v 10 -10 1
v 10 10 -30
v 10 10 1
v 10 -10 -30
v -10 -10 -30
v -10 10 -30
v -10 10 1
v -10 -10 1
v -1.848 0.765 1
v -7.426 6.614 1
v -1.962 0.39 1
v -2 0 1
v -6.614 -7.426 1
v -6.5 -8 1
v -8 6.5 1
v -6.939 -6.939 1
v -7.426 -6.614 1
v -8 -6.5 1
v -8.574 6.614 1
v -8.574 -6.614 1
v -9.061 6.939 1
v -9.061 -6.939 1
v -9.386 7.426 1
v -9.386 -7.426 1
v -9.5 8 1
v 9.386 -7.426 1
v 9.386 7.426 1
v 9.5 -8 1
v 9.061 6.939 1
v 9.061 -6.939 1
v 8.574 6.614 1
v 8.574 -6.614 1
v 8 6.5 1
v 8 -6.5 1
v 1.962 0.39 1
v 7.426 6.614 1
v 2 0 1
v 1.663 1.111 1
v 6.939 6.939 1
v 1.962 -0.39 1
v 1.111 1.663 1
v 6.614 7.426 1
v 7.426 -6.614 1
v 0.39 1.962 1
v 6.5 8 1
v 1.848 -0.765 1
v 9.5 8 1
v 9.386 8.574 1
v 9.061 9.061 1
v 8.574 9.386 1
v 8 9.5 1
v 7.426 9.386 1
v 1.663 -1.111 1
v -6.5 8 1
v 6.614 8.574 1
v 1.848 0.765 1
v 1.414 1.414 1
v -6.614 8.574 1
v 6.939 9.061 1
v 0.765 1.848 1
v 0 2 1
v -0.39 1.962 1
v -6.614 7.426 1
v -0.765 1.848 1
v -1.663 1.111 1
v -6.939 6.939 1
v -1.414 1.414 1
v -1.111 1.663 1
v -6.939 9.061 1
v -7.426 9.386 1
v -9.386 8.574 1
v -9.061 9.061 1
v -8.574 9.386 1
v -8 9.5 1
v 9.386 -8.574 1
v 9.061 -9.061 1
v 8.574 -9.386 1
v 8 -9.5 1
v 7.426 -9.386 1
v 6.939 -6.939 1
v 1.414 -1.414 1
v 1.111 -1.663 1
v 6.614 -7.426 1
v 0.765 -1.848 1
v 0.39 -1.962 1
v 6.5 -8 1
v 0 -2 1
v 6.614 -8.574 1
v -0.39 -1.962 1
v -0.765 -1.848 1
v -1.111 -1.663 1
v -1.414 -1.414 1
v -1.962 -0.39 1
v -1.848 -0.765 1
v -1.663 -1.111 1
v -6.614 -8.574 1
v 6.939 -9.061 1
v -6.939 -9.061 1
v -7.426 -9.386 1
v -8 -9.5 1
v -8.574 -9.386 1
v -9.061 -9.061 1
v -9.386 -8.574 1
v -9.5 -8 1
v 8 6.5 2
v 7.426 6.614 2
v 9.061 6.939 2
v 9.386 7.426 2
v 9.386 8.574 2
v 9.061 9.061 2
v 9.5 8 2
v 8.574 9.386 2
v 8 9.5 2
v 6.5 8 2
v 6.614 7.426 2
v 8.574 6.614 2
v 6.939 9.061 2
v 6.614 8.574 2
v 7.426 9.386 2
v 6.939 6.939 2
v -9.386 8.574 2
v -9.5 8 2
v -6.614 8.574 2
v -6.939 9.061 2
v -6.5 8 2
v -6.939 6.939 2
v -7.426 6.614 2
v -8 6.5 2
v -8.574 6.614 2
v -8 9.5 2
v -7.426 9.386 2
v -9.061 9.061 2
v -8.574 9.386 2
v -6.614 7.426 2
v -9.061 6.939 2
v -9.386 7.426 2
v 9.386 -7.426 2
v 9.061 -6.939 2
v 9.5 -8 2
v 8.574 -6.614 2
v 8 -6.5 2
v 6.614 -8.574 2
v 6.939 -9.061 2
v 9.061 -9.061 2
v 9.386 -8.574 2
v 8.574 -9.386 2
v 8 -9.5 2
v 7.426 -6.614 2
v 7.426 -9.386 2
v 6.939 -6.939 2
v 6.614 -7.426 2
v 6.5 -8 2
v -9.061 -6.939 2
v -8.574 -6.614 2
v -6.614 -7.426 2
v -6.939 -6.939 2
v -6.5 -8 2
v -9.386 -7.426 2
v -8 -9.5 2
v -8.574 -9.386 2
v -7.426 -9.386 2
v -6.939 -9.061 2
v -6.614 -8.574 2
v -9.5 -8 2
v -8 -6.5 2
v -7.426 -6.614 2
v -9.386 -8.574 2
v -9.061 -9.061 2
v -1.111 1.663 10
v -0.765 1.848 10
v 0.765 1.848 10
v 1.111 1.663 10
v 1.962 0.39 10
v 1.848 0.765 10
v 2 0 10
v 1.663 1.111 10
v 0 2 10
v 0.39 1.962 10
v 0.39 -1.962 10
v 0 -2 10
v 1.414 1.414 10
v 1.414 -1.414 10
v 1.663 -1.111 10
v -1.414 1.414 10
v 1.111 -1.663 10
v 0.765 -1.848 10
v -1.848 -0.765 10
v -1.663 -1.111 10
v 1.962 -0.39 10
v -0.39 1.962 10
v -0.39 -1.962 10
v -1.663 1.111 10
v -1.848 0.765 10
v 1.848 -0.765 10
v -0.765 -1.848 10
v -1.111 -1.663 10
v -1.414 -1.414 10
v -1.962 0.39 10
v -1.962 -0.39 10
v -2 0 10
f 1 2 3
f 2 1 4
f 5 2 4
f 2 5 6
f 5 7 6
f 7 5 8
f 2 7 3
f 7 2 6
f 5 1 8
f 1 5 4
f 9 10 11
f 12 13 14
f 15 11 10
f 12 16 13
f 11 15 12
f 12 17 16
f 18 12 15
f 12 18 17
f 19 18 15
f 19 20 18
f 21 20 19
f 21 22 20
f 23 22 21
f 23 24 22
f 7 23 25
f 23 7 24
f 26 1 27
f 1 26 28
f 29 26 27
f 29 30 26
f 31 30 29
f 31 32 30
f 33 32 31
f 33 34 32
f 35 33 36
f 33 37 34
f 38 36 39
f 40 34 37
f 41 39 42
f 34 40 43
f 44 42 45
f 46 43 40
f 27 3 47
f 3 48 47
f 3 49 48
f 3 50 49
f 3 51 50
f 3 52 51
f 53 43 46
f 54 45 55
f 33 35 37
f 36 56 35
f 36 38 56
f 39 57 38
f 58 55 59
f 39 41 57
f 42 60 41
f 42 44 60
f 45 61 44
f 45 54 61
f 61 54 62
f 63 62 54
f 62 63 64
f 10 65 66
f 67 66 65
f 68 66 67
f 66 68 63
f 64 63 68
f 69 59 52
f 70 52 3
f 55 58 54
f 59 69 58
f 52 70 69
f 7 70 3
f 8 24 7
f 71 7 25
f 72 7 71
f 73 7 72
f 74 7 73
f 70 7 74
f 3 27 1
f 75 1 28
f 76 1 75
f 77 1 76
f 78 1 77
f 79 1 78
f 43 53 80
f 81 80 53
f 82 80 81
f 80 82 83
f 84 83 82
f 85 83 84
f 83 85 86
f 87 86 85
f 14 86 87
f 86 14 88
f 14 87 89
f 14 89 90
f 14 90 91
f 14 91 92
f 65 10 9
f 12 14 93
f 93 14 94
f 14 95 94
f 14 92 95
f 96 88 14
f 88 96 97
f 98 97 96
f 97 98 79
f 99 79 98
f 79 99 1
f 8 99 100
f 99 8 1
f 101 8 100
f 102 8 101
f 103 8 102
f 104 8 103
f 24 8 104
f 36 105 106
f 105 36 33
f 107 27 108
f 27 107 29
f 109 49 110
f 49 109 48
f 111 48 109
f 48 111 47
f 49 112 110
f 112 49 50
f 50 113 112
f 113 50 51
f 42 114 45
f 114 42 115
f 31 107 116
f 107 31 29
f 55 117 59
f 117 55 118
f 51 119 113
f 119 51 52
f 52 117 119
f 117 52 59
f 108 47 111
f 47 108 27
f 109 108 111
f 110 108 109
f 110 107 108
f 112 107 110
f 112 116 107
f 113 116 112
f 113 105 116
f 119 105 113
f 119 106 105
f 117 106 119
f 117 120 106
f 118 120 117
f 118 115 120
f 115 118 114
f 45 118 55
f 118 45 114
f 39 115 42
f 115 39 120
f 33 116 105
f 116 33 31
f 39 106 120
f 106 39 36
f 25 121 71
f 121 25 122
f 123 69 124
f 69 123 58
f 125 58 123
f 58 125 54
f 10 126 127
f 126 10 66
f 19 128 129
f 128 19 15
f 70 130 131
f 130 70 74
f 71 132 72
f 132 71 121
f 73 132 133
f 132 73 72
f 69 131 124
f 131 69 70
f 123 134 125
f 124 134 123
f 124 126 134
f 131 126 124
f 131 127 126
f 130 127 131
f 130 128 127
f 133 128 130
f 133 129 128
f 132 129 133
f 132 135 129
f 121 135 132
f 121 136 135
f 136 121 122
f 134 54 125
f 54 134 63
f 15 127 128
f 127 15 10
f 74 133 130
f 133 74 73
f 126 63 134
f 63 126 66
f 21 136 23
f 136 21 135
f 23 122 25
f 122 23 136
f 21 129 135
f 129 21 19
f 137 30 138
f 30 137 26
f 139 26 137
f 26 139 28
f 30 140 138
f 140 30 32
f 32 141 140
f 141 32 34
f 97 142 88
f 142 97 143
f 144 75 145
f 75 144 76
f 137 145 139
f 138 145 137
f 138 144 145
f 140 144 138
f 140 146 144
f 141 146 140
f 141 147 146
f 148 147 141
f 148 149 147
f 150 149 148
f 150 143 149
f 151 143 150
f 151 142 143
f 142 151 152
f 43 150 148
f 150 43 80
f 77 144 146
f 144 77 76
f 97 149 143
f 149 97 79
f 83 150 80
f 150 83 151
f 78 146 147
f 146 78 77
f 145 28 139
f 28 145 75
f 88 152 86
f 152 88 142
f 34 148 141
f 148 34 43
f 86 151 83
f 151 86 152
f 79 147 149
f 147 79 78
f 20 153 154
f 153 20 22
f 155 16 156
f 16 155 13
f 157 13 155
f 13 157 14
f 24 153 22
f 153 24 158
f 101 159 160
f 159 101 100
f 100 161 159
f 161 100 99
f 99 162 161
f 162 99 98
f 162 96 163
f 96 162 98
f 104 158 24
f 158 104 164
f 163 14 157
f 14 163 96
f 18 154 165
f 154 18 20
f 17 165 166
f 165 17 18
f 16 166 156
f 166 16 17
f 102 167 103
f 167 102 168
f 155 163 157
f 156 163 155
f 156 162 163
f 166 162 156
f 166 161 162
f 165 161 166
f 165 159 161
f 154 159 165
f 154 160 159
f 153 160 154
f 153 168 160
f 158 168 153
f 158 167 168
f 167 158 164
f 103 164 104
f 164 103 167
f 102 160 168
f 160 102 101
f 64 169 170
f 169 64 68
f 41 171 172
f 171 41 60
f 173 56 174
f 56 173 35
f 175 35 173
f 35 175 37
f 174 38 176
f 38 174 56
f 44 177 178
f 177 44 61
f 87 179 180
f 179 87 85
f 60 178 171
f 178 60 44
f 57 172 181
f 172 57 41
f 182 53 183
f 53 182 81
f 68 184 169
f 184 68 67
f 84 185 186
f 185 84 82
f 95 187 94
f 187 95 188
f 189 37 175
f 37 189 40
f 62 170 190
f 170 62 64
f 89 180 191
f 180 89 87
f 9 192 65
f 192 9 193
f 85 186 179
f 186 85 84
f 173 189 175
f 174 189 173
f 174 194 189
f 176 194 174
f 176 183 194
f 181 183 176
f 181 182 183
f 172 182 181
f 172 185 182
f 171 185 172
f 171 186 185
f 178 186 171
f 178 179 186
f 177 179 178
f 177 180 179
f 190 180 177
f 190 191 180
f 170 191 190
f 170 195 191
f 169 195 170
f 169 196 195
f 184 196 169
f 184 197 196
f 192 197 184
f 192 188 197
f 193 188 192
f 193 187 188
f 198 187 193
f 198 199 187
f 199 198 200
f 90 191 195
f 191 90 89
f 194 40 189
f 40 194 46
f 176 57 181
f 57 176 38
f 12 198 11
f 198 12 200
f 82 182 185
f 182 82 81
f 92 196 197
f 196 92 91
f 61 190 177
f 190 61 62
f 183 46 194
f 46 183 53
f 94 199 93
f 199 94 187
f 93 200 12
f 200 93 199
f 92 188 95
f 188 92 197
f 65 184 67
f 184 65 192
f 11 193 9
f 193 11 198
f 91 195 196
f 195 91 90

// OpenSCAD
// Parameters
face_width = 20.0; //[10.0:40.0:0.5]
body_length = 30.0; //[15.0:60.0:0.5]
shaft_diameter = 4.0; //[2.0:8.0:0.1]
shaft_length = 10.0; //[5.0:20.0:0.5]
mount_hole_spacing = 16.0; //[8.0:32.0:0.5]
mount_hole_diameter = 3.0; //[1.5:6.0:0.1]
face_thickness = 2.0; //[1.0:6.0:0.25]
shaft_offset_from_face = 0.0; //[-2.0:5.0:0.25]
overlap = 1.0; //[0.5:2.0:0.1]
pattern_marker_diameter = 1.0; //[0.5:2.0:0.1]
pattern_marker_height = 1.0; //[0.5:3.0:0.1]
ttrack_length = 30.0; //[15.0:60.0:0.5]
ttrack_pitch = 10.0; //[5.0:20.0:0.5]
ttrack_num_insert_holes = 2; //[1:6:1]
rail_hole_spacing = 12.0; //[6.0:24.0:0.5]
grill_hole_spacing = 6.0; //[3.0:12.0:0.5]

// Motor Shaft
module motor_shaft() {
  color("Silver") {
    translate([0, 0, face_thickness/2 + shaft_length/2 - overlap + shaft_offset_from_face])
      cylinder(h=shaft_length, r=shaft_diameter/2, center=true, $fn=32);
  }
}

// Ttrack Hole Positions
module ttrack_hole_positions() {
  color("DimGray") {
    translate([0, ttrack_pitch/2, -(face_thickness/2 + pattern_marker_height/2 - overlap)])
      cylinder(h=pattern_marker_height, r=pattern_marker_diameter/2, center=true, $fn=16);
    translate([0, -ttrack_pitch/2, -(face_thickness/2 + pattern_marker_height/2 - overlap)])
      cylinder(h=pattern_marker_height, r=pattern_marker_diameter/2, center=true, $fn=16);
  }
}

// Ttrack Insert Hole Positions
module ttrack_insert_hole_positions() {
  color("DimGray") {
    for (i = [1:ttrack_num_insert_holes]) {
      translate([i*ttrack_length/(ttrack_num_insert_holes+1) - ttrack_length/2, 0, -(face_thickness/2 + pattern_marker_height/2 - overlap)])
        cylinder(h=pattern_marker_height, r=pattern_marker_diameter/2, center=true, $fn=16);
    }
  }
}

// Rail Hole Positions
module rail_hole_positions() {
  color("DimGray") {
    translate([rail_hole_spacing/2, 0, -(face_thickness/2 + pattern_marker_height/2 - overlap)])
      cylinder(h=pattern_marker_height, r=pattern_marker_diameter/2, center=true, $fn=16);
    translate([-rail_hole_spacing/2, 0, -(face_thickness/2 + pattern_marker_height/2 - overlap)])
      cylinder(h=pattern_marker_height, r=pattern_marker_diameter/2, center=true, $fn=16);
  }
}

// Grill Hole Positions
module grill_hole_positions() {
  color("DimGray") {
    translate([grill_hole_spacing/2, grill_hole_spacing/2, -(face_thickness/2 + pattern_marker_height/2 - overlap)])
      cylinder(h=pattern_marker_height, r=pattern_marker_diameter/2, center=true, $fn=16);
    translate([-grill_hole_spacing/2, grill_hole_spacing/2, -(face_thickness/2 + pattern_marker_height/2 - overlap)])
      cylinder(h=pattern_marker_height, r=pattern_marker_diameter/2, center=true, $fn=16);
    translate([grill_hole_spacing/2, -grill_hole_spacing/2, -(face_thickness/2 + pattern_marker_height/2 - overlap)])
      cylinder(h=pattern_marker_height, r=pattern_marker_diameter/2, center=true, $fn=16);
    translate([-grill_hole_spacing/2, -grill_hole_spacing/2, -(face_thickness/2 + pattern_marker_height/2 - overlap)])
      cylinder(h=pattern_marker_height, r=pattern_marker_diameter/2, center=true, $fn=16);
  }
}

// Assembly
module assembly() {
  color("Black") {
    // Motor Body
    translate([0, 0, -(face_thickness/2 + body_length/2 - overlap)])
      cube([face_width, face_width, body_length], center=true);
    // Front Face
    translate([0, 0, 0])
      cube([face_width, face_width, face_thickness], center=true);
  }
  motor_shaft();
  ttrack_hole_positions();
  ttrack_insert_hole_positions();
  rail_hole_positions();
  grill_hole_positions();
  // Mounting Holes
  color("Black") {
    translate([mount_hole_spacing/2, mount_hole_spacing/2, 0])
      cylinder(h=face_thickness + 2*overlap, r=mount_hole_diameter/2, center=true, $fn=16);
    translate([-mount_hole_spacing/2, mount_hole_spacing/2, 0])
      cylinder(h=face_thickness + 2*overlap, r=mount_hole_diameter/2, center=true, $fn=16);
    translate([mount_hole_spacing/2, -mount_hole_spacing/2, 0])
      cylinder(h=face_thickness + 2*overlap, r=mount_hole_diameter/2, center=true, $fn=16);
    translate([-mount_hole_spacing/2, -mount_hole_spacing/2, 0])
      cylinder(h=face_thickness + 2*overlap, r=mount_hole_diameter/2, center=true, $fn=16);
  }
}

assembly();
